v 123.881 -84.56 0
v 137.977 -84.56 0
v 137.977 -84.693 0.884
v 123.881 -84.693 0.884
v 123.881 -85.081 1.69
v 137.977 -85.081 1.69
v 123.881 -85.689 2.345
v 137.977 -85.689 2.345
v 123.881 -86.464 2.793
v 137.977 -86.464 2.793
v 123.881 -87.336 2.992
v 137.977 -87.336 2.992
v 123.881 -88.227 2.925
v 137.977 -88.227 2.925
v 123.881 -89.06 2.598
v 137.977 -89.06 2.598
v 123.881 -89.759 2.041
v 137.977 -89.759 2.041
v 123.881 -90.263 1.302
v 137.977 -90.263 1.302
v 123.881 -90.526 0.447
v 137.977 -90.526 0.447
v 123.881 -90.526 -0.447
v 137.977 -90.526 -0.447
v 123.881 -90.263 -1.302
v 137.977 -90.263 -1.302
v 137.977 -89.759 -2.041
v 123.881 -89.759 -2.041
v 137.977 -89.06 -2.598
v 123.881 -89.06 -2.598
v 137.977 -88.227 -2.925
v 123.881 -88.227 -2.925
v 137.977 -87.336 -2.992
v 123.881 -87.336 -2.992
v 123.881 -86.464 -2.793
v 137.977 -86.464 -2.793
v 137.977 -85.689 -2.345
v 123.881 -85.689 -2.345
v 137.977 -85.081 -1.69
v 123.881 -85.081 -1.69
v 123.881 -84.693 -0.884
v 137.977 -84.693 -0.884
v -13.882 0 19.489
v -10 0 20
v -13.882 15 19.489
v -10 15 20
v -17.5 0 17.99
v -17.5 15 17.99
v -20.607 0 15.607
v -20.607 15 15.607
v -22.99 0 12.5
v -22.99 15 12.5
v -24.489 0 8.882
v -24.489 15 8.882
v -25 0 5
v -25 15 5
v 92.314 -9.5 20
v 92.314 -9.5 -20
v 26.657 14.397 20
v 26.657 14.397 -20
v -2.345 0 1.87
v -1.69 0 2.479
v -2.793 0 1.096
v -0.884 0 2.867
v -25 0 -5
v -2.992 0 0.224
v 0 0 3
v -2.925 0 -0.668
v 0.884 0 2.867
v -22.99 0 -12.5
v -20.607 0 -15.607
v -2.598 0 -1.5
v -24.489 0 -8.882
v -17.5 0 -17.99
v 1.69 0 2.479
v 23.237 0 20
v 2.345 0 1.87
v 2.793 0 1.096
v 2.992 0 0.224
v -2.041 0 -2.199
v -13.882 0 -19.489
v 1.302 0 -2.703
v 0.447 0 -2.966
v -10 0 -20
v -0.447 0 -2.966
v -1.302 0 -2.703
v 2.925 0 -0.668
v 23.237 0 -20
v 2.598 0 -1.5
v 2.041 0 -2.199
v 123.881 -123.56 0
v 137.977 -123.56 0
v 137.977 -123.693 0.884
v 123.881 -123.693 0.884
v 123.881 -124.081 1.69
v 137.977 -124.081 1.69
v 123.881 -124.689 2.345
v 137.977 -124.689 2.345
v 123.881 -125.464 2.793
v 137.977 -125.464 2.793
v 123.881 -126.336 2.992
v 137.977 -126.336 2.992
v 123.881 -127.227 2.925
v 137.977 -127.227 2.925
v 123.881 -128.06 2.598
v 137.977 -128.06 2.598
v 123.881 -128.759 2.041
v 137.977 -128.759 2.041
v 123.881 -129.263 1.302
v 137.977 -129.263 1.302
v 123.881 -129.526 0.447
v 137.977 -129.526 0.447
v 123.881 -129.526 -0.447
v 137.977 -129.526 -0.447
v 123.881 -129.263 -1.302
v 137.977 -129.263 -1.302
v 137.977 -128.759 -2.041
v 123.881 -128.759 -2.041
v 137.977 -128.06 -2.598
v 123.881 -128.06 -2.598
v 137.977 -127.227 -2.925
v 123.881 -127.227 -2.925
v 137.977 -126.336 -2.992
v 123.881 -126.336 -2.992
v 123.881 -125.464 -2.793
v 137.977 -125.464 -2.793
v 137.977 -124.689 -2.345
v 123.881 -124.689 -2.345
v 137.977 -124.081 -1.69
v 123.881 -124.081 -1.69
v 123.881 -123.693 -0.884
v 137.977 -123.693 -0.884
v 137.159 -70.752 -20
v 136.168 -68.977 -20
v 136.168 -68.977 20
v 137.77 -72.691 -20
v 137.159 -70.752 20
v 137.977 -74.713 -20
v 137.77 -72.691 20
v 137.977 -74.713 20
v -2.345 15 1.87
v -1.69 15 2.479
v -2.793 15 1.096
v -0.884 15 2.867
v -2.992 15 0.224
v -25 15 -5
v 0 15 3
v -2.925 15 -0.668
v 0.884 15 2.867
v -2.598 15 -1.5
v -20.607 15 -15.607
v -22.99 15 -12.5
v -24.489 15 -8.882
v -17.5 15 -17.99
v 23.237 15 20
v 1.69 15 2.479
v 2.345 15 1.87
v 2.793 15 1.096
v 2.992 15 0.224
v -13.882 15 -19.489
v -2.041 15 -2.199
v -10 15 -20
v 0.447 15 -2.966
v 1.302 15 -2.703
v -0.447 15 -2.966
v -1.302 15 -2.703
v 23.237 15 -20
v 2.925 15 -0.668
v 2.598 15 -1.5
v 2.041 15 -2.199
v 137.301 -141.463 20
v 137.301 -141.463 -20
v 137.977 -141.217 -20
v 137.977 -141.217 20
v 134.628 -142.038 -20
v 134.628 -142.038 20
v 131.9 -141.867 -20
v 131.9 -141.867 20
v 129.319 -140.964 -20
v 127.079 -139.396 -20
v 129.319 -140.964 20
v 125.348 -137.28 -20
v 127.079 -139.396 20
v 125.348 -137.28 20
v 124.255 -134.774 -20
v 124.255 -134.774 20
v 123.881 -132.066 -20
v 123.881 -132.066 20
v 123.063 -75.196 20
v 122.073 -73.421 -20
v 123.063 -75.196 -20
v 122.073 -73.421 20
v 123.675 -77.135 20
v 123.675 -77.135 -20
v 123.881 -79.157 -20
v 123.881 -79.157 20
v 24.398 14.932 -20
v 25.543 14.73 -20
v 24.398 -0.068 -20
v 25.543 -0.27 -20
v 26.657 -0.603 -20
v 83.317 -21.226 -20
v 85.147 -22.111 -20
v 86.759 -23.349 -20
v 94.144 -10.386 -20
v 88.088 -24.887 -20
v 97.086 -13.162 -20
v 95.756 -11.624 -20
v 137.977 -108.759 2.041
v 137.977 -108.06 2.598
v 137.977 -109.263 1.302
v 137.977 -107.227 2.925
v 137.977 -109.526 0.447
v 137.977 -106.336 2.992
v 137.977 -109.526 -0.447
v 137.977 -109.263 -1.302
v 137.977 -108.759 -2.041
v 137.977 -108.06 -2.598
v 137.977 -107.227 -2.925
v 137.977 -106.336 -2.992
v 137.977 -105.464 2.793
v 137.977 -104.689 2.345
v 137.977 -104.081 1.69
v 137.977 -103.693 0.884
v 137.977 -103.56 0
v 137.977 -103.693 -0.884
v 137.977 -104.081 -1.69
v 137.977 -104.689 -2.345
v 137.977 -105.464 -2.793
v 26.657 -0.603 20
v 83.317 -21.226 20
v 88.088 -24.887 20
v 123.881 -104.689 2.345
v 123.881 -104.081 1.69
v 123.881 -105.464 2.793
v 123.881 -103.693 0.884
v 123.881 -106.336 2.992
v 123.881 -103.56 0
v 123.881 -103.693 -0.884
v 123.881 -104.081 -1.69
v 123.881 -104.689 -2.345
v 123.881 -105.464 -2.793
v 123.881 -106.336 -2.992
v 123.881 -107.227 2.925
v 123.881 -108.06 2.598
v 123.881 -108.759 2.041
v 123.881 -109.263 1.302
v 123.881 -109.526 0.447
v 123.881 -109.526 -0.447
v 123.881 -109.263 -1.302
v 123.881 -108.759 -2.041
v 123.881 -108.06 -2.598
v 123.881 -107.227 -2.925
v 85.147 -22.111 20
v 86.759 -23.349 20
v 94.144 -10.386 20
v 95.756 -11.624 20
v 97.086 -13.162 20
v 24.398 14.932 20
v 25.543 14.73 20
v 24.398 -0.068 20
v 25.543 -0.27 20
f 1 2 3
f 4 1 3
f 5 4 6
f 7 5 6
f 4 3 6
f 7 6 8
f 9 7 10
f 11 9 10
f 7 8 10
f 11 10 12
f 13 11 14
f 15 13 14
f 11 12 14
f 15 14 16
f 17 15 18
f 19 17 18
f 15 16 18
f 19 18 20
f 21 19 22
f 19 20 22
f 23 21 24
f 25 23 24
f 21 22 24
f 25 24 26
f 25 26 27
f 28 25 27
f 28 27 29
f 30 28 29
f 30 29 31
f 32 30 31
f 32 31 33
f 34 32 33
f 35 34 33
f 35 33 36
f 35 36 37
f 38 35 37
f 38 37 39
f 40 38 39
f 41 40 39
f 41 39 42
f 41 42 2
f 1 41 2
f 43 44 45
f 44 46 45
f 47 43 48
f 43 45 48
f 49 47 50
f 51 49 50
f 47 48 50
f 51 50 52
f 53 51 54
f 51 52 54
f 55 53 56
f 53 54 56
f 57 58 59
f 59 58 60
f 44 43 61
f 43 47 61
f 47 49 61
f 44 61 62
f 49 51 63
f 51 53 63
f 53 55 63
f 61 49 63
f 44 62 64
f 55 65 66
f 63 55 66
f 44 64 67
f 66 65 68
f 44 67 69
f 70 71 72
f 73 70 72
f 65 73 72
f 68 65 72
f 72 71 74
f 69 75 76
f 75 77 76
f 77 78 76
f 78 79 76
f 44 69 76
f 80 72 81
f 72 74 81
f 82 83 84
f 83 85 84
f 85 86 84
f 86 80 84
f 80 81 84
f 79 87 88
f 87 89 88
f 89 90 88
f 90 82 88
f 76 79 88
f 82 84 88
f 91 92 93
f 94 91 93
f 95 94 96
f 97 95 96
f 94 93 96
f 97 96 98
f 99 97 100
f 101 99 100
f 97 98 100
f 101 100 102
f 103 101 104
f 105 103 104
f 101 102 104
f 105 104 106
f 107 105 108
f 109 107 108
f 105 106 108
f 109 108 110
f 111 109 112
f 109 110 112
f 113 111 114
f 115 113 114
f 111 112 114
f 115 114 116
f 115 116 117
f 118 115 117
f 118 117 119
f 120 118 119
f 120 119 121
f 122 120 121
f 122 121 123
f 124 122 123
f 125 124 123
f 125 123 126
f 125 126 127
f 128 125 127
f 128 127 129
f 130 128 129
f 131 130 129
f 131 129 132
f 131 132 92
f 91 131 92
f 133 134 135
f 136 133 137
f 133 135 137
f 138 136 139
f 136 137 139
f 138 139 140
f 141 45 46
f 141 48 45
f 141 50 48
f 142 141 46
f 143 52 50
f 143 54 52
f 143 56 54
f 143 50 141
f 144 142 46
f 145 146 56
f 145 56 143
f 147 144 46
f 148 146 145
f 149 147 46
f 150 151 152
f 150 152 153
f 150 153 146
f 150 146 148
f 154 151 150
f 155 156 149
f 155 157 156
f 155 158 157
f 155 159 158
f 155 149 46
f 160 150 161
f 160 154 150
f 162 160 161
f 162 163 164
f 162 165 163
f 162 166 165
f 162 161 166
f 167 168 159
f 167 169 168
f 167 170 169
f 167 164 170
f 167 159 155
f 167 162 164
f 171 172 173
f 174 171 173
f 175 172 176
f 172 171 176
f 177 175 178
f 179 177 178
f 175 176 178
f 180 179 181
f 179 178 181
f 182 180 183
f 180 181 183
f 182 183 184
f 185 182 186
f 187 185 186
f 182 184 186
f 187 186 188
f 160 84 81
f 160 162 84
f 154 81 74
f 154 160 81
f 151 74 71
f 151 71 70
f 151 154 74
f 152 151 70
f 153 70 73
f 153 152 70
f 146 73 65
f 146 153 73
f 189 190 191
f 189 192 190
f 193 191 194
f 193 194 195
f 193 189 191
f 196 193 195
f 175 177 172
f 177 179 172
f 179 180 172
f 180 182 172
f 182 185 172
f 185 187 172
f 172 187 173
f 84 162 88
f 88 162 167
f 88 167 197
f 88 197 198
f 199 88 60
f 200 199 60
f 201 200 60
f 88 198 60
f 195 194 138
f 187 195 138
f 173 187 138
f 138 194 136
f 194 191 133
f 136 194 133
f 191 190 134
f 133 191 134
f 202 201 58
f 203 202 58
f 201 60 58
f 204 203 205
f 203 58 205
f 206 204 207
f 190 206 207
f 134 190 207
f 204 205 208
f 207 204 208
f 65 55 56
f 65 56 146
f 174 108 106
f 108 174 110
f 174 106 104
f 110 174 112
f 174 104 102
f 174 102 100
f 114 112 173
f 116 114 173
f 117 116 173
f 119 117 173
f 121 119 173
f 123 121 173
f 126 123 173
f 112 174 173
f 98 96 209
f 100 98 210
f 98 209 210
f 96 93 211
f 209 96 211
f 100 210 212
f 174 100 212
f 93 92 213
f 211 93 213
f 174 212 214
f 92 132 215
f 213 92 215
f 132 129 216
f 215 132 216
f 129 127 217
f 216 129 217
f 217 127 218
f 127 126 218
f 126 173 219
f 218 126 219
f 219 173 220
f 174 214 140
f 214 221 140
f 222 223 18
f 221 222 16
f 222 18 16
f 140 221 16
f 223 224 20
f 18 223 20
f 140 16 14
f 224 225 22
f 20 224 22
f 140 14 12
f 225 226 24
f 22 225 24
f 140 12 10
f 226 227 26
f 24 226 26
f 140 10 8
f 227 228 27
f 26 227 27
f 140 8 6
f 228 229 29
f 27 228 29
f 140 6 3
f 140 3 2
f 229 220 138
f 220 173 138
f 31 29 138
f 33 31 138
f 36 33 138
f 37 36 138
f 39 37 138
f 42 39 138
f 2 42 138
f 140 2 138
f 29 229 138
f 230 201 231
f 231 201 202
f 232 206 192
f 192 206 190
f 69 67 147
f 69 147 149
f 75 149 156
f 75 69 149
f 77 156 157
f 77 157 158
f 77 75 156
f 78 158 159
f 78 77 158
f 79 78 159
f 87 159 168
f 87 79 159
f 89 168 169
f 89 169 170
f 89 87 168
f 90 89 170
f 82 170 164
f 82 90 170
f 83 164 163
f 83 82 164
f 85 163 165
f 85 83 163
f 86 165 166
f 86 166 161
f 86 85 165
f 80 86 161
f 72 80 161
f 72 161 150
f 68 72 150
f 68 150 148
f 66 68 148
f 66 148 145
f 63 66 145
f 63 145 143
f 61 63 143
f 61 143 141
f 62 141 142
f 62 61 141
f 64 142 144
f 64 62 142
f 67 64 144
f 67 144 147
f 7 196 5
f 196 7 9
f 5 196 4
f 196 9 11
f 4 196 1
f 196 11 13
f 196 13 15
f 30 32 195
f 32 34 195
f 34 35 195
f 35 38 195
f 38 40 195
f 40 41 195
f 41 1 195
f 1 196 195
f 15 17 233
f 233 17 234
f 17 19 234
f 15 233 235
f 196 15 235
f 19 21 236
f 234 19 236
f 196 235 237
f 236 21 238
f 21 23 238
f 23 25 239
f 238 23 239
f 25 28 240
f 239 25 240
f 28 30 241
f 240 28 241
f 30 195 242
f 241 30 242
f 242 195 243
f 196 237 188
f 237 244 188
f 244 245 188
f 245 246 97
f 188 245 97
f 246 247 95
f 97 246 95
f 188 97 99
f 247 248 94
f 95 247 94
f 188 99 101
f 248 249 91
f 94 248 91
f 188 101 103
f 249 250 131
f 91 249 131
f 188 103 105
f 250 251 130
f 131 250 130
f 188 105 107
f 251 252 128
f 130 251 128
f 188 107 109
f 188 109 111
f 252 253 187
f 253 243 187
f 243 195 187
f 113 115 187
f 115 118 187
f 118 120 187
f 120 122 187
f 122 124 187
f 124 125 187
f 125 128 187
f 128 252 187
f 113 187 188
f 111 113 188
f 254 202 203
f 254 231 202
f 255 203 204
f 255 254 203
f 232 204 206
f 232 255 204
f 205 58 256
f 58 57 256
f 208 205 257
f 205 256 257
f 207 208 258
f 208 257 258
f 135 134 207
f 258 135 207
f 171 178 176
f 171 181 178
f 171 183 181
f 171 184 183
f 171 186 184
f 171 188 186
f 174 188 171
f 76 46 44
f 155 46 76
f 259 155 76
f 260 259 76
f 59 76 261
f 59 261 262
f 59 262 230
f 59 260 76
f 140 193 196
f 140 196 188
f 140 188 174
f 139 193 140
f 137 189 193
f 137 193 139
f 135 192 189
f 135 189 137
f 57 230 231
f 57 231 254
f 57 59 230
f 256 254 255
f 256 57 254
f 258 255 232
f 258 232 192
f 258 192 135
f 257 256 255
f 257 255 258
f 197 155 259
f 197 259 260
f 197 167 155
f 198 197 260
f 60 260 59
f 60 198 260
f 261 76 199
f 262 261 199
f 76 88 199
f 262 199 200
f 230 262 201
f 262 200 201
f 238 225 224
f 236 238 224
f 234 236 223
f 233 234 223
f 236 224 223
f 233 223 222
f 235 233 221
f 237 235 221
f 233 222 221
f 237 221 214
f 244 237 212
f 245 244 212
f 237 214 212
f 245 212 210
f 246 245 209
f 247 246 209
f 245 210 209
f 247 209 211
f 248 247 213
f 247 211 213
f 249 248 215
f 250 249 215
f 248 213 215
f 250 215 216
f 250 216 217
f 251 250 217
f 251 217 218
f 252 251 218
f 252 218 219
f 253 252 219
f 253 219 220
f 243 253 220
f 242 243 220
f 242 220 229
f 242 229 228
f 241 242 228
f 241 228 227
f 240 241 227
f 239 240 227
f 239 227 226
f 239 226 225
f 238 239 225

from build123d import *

# Parameters (mm, degrees)
SKETCH1_W           = 50
SKETCH1_H           = 40
SKETCH1_R           = 3
BOSS_EXTRUDE1_DEPTH = 15
SWEEP1_START        = -20
SWEEP1_DEPTH        = 40
FILLET1_R           = 15
SKETCH3_R           = 3
CUT_EXTRUDE1_DEPTH  = 220.951933549
FILLET2_R           = 10


# Read off the part's stored shape, not the designer's step: Sweep1
with BuildPart() as part:
    # Sketch1 → Boss-Extrude1 (new body)
    with BuildSketch(Plane(origin=(0, 0, 0), x_dir=(1, 0, 0), z_dir=(0, 1, 0))):
        Rectangle(SKETCH1_W, SKETCH1_H)
        with Locations(Location((0, 0, 0), (0, 0, 270))):
            Circle(SKETCH1_R, mode=Mode.SUBTRACT)
    extrude(amount=BOSS_EXTRUDE1_DEPTH)

    # Sweep1 outline → Sweep1 (add)
    with BuildSketch(Plane.XY.offset(SWEEP1_START)):
        Polygon((123.881139344, -76.004182722), (123.881139344, -146.347204208), (137.976528655, -141.216902058), (137.976528655, -71.559923544), (95.277055769, -10.578756452), (25, 15), (25, 0), (86.279911141, -22.304063614), align=None)
    extrude(amount=SWEEP1_DEPTH)

    # Fillet1
    fillet1_edges = [part.edges().sort_by_distance(p)[0] for p in [
        (-25, 7.5, 20),
        (-25, 7.5, -20),
    ]]
    fillet(fillet1_edges, radius=FILLET1_R)

    # Sketch3 → Cut-Extrude1 (cut, through all)
    with BuildSketch(Plane(origin=(137.976528655, 0, 0), x_dir=(0, 0, -1), z_dir=(1, 0, 0))):
        with Locations(Location((0, -106.559923544, 0), (0, 0, 90))):
            Circle(SKETCH3_R)
        with Locations(Location((0, -87.559923544, 0), (0, 0, 90))):
            Circle(SKETCH3_R)
        with Locations(Location((0, -126.559923544, 0), (0, 0, 90))):
            Circle(SKETCH3_R)
    extrude(amount=-CUT_EXTRUDE1_DEPTH, mode=Mode.SUBTRACT)

    # Fillet2
    fillet2_edges = [part.edges().sort_by_distance(p)[0] for p in [
        (123.881139344, -146.347204208, 0),
        (137.976528655, -71.559923544, 0),
        (123.881139344, -76.004182722, 0),
        (95.277055769, -10.578756452, 0),
        (86.279911141, -22.304063614, 0),
        (25, 15, 0),
        (25, 0, 0),
    ]]
    fillet(fillet2_edges, radius=FILLET2_R)


solid = part.part
